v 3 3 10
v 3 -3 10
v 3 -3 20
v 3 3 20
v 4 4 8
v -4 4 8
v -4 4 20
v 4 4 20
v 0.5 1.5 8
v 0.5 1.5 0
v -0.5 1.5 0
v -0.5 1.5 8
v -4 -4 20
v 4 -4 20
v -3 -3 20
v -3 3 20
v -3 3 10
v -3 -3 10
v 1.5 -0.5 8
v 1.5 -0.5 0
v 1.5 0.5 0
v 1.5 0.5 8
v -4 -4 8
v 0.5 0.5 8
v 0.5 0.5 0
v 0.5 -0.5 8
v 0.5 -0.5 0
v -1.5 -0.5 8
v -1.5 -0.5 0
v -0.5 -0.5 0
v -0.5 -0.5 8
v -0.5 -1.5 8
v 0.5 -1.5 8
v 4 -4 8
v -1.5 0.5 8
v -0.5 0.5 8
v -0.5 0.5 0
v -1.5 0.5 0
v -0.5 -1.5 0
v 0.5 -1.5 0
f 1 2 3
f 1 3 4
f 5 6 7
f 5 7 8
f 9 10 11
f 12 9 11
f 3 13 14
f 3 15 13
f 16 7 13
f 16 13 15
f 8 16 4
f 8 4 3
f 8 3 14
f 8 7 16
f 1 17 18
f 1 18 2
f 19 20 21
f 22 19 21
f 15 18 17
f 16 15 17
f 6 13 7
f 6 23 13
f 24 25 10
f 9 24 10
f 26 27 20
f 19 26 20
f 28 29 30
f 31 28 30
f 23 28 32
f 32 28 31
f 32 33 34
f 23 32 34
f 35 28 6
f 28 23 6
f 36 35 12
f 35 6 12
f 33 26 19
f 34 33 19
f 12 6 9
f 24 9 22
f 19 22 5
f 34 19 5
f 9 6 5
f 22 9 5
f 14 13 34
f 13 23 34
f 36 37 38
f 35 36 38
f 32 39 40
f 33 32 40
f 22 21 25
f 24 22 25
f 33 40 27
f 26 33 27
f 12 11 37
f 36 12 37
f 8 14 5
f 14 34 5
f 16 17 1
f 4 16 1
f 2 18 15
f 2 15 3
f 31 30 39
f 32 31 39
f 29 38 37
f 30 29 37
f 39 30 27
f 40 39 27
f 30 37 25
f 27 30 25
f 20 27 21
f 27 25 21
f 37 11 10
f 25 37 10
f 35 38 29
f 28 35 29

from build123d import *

# Parameters (mm, degrees)
F1_DEPTH = 10
F2_W     = 6
F2_H     = 6
F2_W_2   = 8
F2_H_2   = 8
F3_DEPTH = 2
F4_DEPTH = 10


with BuildPart() as f1:
    # F0 (on Top) → F1 (new body)
    with BuildSketch(Plane.XY):
        Polygon((-0.5, 0.5), (-1.5, 0.5), (-1.5, -0.5), (-0.5, -0.5), (-0.5, -1.5), (0.5, -1.5), (0.5, -0.5), (1.5, -0.5), (1.5, 0.5), (0.5, 0.5), (0.5, 1.5), (-0.5, 1.5), align=None)
    extrude(amount=F1_DEPTH)

    # F2 (on face) → F3 (join)
    with BuildSketch(Plane.XY.offset(10)):
        Rectangle(F2_W_2, F2_H_2)
        Rectangle(F2_W, F2_H, mode=Mode.SUBTRACT)
        Rectangle(F2_W, F2_H)
        Polygon((-1.5, 0.5), (-0.5, 0.5), (-0.5, 1.5), (0.5, 1.5), (0.5, 0.5), (1.5, 0.5), (1.5, -0.5), (0.5, -0.5), (0.5, -1.5), (-0.5, -1.5), (-0.5, -0.5), (-1.5, -0.5), align=None, mode=Mode.SUBTRACT)
    extrude(amount=-F3_DEPTH)

    # F2 (on face) → F4 (join)
    with BuildSketch(Plane.XY.offset(10)):
        Rectangle(F2_W_2, F2_H_2)
        Rectangle(F2_W, F2_H, mode=Mode.SUBTRACT)
    extrude(amount=F4_DEPTH)


solid = f1.part
